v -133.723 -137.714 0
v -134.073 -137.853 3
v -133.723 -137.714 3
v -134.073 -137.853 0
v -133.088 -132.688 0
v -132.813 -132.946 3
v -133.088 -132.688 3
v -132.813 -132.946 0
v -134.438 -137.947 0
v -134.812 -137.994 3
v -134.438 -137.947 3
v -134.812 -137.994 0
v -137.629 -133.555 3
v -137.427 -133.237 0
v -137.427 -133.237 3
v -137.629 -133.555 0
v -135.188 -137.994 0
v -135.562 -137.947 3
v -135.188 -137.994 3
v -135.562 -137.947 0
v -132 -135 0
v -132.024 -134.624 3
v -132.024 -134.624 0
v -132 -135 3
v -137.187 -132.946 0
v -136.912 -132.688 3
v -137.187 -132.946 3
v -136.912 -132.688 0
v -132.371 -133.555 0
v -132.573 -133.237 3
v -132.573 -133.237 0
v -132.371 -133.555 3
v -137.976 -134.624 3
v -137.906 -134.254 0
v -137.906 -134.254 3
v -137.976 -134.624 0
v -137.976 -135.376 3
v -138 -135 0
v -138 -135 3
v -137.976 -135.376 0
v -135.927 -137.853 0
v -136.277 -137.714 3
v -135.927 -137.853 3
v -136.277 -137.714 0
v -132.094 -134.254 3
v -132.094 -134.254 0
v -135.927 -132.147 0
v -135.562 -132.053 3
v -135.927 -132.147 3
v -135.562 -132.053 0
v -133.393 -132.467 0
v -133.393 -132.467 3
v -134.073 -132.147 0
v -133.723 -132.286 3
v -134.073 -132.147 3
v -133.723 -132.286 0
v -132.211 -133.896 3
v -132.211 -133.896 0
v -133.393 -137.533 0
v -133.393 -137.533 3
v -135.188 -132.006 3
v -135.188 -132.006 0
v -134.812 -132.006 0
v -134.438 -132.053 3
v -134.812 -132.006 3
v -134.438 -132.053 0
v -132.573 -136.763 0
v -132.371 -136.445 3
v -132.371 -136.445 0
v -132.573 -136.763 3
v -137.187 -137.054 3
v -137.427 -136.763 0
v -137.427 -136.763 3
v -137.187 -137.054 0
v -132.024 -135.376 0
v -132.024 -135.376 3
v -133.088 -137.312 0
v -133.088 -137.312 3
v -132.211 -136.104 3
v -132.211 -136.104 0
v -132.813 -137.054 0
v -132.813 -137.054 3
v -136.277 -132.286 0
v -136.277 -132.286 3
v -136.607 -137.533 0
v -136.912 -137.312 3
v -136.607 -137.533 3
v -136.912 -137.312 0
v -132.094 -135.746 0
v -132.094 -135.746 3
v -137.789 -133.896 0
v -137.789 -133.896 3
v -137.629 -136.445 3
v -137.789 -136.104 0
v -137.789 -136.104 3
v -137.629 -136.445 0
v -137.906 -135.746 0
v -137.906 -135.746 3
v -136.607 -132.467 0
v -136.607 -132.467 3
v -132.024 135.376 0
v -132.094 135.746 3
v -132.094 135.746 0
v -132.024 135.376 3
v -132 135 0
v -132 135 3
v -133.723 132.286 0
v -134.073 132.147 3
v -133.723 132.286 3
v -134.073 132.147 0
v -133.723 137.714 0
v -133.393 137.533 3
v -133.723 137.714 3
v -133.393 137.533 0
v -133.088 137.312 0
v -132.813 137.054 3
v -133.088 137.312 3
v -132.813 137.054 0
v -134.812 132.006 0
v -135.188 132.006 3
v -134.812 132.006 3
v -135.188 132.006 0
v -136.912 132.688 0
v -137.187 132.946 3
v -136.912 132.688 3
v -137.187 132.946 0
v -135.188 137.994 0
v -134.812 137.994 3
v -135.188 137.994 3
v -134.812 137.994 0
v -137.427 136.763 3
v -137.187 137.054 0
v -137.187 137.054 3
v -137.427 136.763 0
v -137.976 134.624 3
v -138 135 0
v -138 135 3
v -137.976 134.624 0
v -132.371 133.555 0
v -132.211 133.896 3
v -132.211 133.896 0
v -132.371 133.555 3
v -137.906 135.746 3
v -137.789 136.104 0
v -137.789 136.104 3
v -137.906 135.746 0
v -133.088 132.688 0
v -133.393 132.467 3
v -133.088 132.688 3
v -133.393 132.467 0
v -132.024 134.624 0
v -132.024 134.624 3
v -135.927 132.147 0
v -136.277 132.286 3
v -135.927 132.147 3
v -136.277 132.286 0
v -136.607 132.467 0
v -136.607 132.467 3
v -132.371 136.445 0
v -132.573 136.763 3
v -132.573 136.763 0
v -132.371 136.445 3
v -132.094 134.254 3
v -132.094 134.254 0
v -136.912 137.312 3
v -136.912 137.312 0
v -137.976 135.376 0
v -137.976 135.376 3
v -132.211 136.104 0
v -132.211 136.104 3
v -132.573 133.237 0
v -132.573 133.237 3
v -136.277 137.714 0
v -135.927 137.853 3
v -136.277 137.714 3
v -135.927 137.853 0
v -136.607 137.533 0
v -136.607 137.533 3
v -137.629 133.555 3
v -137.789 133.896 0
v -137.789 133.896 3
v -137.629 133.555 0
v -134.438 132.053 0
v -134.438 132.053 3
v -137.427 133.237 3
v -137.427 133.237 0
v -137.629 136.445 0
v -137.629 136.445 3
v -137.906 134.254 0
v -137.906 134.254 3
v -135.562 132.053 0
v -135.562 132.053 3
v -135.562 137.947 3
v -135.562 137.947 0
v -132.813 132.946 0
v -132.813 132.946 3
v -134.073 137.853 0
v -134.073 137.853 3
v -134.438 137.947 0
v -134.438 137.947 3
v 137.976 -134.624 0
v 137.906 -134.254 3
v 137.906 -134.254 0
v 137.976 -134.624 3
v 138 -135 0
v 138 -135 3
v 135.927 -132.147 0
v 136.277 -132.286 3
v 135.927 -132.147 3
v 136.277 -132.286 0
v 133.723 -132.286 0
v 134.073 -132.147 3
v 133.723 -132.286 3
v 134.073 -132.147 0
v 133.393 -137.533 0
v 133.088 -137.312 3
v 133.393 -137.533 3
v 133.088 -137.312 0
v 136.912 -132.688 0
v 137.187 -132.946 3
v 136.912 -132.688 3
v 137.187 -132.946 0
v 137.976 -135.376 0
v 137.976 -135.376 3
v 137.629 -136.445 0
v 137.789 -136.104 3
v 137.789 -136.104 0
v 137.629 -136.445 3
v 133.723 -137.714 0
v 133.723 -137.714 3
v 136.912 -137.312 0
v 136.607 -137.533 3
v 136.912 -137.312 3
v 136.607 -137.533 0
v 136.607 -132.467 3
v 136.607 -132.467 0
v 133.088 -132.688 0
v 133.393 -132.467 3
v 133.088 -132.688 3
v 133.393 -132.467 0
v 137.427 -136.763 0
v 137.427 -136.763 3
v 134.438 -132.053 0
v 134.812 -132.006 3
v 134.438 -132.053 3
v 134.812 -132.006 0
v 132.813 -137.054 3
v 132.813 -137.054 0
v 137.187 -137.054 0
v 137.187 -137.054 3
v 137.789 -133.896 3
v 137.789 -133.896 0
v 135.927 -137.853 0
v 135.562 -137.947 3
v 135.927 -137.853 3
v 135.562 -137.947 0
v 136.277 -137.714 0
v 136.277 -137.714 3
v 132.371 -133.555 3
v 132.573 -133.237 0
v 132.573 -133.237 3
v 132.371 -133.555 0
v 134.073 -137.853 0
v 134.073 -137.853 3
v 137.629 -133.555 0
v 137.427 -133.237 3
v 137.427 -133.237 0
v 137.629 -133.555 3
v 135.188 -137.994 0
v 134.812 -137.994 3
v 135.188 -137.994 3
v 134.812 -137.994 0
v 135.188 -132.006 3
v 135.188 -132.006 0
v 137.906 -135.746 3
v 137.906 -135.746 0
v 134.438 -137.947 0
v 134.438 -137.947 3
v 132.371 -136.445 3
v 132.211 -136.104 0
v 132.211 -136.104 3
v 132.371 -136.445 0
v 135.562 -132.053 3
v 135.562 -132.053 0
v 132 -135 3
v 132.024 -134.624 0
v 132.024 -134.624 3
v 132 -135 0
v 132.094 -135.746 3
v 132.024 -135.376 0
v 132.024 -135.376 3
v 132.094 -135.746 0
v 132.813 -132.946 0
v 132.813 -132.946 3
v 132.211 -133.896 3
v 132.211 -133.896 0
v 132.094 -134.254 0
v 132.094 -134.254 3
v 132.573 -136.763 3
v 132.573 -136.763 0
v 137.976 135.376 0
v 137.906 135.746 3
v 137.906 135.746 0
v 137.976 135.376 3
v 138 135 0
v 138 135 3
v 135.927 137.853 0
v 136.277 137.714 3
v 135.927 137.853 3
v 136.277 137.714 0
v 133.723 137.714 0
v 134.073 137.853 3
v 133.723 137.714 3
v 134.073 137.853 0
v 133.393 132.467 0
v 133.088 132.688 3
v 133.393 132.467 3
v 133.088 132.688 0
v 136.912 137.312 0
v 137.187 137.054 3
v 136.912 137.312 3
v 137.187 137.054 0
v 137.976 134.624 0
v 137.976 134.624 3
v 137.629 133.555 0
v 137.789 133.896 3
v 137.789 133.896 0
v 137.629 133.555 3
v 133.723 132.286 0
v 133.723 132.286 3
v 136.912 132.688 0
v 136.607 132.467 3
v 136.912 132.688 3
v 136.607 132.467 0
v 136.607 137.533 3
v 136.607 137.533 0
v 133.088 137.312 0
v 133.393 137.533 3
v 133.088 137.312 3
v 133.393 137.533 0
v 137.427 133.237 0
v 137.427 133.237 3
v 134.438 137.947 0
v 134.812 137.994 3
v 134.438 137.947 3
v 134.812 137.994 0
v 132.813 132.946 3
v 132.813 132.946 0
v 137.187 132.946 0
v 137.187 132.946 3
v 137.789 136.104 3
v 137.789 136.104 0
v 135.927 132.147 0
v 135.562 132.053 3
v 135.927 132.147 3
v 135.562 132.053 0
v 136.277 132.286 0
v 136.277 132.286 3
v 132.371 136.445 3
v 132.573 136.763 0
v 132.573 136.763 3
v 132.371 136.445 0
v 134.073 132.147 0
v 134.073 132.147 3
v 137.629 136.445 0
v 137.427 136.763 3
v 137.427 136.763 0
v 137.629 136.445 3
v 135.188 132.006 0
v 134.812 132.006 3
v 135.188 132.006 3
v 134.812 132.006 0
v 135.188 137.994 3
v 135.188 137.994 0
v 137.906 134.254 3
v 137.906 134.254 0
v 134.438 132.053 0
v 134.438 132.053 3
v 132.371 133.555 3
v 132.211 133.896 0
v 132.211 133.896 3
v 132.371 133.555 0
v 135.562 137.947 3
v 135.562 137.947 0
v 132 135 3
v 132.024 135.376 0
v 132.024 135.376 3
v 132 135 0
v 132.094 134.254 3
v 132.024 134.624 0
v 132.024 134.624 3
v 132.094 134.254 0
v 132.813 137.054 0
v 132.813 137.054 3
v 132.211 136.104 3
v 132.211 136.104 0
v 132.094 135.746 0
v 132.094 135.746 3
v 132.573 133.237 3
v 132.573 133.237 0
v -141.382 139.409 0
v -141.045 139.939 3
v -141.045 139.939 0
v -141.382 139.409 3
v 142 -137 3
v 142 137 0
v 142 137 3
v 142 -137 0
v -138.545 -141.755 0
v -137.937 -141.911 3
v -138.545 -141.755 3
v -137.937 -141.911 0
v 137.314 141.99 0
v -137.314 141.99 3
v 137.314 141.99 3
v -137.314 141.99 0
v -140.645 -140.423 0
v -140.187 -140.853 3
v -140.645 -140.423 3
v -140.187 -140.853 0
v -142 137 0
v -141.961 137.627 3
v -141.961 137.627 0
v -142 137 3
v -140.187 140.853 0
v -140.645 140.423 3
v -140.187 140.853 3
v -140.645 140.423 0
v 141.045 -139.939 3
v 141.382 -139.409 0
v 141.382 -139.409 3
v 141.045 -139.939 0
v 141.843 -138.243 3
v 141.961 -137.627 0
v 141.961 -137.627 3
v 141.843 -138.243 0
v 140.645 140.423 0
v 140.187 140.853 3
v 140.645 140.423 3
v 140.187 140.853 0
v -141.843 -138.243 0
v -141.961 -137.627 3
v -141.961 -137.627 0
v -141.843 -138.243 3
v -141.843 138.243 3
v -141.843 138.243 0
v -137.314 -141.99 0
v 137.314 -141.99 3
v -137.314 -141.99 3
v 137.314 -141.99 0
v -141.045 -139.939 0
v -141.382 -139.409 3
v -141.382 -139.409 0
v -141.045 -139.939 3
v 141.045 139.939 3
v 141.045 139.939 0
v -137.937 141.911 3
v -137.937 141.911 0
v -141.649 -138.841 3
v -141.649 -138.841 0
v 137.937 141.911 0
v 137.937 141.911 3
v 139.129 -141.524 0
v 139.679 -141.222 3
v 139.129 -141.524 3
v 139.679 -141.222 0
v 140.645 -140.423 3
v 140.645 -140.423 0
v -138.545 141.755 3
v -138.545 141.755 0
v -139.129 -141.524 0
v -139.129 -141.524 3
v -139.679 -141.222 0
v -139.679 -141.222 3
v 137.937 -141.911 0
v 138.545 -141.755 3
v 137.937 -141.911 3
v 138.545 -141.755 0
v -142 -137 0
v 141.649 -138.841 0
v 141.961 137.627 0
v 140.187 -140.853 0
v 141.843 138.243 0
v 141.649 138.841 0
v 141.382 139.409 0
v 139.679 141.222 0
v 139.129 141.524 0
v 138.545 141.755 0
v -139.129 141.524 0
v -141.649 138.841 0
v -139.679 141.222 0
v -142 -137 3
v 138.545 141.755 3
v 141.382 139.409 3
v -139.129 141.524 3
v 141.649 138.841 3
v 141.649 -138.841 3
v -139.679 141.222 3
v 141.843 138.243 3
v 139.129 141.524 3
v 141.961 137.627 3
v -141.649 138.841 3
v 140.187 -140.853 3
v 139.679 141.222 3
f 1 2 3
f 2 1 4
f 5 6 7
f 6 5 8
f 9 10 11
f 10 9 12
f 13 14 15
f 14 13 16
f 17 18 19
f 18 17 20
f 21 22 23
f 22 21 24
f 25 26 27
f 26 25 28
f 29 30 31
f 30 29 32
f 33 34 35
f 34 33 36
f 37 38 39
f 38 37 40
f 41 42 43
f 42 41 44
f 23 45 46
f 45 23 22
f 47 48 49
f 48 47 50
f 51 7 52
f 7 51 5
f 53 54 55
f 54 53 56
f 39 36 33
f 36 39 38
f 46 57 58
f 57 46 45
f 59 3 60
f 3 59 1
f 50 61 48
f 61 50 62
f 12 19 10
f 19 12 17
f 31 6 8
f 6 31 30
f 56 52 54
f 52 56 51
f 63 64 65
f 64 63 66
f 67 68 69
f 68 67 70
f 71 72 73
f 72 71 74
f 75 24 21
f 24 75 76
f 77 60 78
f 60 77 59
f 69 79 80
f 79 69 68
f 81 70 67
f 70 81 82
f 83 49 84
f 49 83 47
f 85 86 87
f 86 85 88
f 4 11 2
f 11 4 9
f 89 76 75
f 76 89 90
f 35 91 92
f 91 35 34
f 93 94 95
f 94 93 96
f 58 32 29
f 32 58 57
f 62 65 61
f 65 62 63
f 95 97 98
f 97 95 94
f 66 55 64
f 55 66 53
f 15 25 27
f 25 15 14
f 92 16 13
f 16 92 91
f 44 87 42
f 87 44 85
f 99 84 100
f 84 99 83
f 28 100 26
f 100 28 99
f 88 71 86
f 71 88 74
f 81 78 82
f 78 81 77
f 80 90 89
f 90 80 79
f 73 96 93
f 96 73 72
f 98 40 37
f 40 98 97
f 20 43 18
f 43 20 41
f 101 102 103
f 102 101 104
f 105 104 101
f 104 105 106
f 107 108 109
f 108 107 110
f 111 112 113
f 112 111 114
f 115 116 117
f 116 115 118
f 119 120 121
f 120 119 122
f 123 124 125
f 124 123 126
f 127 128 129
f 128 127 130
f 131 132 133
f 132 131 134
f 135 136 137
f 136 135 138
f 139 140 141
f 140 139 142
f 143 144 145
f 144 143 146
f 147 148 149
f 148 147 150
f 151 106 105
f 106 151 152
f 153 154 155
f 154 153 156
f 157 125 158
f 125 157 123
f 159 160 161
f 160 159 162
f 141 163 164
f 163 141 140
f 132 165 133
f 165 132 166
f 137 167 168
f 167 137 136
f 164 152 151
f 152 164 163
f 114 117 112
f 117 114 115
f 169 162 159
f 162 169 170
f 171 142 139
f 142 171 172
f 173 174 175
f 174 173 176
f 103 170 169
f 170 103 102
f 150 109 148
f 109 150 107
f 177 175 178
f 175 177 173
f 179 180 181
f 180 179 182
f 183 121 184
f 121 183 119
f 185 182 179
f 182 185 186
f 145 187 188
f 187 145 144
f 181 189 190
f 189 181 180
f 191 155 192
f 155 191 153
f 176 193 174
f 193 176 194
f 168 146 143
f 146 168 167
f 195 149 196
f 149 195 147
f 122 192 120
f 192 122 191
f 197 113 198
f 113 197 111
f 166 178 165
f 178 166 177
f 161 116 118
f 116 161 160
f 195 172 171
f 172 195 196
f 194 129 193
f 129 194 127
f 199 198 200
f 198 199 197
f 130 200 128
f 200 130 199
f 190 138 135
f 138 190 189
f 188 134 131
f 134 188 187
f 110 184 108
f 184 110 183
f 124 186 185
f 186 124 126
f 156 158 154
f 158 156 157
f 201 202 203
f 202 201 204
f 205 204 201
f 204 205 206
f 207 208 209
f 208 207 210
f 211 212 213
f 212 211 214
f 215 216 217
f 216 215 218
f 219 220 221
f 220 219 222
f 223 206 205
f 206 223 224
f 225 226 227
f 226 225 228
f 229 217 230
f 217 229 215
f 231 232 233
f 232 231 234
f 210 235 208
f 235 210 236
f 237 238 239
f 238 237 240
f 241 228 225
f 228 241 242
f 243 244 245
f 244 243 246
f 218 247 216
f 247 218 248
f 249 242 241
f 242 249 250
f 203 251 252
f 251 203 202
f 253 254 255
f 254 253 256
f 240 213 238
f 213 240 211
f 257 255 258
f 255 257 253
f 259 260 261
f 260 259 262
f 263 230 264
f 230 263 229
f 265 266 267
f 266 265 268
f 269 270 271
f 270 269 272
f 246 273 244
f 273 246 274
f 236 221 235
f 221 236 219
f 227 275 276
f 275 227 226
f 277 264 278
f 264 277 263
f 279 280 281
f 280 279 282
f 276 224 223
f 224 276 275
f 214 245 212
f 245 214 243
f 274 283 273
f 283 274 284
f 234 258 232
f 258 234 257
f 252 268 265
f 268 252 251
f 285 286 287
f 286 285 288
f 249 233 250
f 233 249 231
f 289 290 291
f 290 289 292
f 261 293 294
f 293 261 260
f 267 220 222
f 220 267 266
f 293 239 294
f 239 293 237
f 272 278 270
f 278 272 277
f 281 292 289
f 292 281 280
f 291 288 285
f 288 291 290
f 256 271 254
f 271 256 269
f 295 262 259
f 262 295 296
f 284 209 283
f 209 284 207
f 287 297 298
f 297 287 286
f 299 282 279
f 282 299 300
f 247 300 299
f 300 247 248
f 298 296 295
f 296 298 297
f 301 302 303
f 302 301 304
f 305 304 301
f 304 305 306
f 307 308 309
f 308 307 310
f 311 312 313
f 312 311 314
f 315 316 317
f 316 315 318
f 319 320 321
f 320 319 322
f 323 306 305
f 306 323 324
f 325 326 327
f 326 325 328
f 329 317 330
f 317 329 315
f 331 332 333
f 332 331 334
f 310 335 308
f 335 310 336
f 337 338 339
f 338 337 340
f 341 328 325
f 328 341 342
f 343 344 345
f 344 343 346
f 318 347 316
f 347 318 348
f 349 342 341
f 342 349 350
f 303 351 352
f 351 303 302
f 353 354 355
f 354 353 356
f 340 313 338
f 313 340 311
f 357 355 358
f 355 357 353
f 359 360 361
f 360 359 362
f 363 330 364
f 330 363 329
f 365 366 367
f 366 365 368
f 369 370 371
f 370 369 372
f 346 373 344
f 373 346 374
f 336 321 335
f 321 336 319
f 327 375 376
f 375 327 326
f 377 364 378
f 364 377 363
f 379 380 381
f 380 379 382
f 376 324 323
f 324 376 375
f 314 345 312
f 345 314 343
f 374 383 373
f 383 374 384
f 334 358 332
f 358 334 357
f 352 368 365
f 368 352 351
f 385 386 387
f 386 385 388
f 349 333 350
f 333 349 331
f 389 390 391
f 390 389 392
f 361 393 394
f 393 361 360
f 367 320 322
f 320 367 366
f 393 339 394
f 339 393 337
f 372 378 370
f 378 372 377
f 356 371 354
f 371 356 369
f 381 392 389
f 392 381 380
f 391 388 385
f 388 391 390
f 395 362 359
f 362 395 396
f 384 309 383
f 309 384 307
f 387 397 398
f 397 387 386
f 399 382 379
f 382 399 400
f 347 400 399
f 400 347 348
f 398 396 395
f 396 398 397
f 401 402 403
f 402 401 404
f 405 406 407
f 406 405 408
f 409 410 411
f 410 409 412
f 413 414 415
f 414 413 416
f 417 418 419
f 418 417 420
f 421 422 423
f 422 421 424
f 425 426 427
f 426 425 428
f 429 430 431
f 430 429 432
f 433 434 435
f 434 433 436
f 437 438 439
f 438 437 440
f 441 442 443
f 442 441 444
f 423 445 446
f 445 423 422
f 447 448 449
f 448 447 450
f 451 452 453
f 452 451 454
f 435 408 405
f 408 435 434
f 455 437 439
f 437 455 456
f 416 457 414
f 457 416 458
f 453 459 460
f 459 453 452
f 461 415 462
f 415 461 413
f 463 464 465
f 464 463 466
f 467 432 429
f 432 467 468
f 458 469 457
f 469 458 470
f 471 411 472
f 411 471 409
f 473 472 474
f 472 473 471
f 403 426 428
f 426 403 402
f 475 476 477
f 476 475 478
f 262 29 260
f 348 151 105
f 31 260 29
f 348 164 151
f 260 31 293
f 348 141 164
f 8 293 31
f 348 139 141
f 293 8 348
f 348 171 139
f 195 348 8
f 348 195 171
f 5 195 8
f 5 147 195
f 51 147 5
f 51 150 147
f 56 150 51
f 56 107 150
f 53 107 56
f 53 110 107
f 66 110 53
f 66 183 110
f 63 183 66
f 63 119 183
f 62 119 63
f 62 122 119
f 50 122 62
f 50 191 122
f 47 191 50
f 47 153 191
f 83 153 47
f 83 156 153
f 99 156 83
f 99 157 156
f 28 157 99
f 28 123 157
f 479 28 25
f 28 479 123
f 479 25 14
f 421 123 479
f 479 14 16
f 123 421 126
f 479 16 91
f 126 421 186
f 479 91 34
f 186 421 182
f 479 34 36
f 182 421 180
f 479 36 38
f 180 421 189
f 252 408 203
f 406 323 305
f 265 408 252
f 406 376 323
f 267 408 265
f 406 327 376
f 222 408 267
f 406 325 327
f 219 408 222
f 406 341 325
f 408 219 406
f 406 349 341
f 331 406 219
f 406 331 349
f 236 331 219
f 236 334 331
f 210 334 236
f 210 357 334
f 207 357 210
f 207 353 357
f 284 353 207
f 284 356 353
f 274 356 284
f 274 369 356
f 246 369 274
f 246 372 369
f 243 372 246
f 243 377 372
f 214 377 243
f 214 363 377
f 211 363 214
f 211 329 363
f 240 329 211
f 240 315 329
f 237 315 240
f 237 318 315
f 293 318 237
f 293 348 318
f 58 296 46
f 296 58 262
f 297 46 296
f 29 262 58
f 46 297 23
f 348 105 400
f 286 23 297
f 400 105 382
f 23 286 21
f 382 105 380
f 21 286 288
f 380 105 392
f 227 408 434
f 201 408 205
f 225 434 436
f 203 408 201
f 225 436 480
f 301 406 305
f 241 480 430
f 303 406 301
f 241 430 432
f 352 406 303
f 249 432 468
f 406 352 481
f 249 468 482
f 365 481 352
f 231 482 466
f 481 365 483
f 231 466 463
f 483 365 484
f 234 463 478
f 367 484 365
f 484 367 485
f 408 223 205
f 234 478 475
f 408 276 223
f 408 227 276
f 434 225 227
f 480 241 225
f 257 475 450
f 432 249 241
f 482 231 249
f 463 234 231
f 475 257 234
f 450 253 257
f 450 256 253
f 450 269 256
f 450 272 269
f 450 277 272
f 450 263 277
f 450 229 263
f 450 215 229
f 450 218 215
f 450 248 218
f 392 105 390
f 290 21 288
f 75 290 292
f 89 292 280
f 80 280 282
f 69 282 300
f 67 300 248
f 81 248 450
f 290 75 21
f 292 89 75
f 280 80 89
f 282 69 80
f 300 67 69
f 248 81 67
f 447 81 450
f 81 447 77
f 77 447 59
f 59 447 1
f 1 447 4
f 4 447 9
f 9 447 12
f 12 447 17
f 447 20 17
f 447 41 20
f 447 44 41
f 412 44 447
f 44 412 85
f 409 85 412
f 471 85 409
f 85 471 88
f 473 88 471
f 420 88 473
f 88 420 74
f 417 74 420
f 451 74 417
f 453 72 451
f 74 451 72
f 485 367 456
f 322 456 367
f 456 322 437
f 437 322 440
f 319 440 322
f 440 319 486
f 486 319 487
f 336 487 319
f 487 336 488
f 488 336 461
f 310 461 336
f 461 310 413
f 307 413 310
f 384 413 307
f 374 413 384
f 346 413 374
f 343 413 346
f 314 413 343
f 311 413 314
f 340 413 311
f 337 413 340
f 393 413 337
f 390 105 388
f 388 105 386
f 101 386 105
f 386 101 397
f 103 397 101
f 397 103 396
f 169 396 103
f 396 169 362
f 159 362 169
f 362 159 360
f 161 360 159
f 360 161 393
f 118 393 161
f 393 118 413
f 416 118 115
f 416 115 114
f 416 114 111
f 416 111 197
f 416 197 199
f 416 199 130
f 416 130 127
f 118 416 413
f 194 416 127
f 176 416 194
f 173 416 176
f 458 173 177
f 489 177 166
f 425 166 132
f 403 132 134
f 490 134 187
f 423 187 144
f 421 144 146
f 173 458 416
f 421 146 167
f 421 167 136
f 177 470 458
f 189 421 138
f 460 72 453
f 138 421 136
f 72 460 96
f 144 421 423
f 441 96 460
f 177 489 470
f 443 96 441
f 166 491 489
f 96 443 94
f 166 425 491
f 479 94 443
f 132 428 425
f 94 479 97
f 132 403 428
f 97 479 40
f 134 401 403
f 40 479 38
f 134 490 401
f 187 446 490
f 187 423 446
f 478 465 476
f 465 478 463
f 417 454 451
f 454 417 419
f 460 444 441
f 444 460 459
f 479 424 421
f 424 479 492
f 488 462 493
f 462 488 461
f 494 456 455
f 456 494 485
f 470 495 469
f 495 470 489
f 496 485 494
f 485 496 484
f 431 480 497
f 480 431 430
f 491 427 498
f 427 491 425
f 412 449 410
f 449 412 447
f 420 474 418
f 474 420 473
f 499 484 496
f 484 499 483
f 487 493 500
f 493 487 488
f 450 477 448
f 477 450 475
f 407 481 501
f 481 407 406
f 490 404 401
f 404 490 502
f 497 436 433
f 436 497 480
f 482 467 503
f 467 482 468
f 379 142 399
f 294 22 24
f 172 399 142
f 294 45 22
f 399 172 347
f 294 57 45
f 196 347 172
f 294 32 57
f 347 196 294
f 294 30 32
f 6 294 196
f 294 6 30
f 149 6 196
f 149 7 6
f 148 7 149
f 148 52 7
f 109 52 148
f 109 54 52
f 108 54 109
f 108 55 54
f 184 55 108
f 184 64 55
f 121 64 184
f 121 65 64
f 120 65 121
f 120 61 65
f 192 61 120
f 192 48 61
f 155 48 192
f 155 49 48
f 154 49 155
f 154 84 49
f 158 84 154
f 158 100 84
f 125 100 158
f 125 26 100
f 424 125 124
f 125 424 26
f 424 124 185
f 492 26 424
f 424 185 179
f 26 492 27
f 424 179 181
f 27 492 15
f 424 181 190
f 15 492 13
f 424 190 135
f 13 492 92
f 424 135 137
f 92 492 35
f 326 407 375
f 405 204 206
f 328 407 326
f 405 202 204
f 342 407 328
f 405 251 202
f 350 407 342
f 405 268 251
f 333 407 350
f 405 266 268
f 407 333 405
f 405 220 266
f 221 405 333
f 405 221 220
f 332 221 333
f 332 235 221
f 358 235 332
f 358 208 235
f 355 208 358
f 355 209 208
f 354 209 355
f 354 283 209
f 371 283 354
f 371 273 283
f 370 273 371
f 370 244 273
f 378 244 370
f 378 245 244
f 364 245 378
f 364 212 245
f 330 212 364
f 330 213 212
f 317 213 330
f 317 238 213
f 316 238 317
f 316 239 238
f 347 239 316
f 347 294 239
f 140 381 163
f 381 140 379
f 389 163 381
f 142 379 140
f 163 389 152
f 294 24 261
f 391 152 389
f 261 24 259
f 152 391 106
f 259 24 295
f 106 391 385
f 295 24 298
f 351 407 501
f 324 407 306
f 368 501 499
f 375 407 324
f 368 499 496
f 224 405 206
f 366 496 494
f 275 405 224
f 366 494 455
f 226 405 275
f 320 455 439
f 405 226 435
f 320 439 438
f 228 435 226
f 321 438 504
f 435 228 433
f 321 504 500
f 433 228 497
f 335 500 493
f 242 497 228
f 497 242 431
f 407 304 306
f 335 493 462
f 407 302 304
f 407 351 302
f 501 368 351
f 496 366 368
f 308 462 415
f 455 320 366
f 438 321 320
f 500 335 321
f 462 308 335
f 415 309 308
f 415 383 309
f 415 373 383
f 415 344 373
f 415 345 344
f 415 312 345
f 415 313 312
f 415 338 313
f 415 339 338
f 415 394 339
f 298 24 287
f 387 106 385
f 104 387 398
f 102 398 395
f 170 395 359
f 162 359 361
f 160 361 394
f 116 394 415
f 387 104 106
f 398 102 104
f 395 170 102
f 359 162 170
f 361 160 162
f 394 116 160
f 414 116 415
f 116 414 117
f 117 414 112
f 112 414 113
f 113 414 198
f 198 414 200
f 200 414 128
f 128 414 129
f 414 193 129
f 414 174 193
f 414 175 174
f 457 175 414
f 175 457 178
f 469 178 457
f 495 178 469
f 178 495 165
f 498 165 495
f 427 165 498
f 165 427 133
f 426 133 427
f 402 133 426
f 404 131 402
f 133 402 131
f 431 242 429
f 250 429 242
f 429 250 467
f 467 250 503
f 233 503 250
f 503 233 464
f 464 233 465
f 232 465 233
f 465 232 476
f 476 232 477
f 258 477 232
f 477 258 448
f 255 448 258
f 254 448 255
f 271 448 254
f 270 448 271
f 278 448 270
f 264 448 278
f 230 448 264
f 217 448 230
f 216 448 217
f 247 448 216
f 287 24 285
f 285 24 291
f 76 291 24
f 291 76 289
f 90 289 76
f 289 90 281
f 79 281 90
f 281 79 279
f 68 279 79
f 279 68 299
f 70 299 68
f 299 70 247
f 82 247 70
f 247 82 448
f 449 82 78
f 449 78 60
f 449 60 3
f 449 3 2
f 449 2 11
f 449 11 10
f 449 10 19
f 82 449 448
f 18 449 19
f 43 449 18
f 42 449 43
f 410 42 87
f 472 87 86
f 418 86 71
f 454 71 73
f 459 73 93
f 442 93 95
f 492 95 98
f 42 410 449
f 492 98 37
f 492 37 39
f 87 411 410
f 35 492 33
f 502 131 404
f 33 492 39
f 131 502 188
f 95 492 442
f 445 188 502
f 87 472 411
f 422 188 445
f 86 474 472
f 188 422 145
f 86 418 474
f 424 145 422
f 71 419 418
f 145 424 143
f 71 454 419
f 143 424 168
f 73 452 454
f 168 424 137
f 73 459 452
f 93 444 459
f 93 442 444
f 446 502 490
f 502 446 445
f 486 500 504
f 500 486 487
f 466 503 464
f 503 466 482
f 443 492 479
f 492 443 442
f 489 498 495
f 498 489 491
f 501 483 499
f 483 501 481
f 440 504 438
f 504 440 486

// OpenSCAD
$fn = 50;


difference() {
	union() {
		hull() {
			translate(v = [-137.0000000000, 137.0000000000, 0]) {
				cylinder(h = 3, r = 5);
			}
			translate(v = [137.0000000000, 137.0000000000, 0]) {
				cylinder(h = 3, r = 5);
			}
			translate(v = [-137.0000000000, -137.0000000000, 0]) {
				cylinder(h = 3, r = 5);
			}
			translate(v = [137.0000000000, -137.0000000000, 0]) {
				cylinder(h = 3, r = 5);
			}
		}
	}
	union() {
		translate(v = [-135.0000000000, -135.0000000000, -100.0000000000]) {
			cylinder(h = 200, r = 3.0000000000);
		}
		translate(v = [-135.0000000000, 135.0000000000, -100.0000000000]) {
			cylinder(h = 200, r = 3.0000000000);
		}
		translate(v = [135.0000000000, -135.0000000000, -100.0000000000]) {
			cylinder(h = 200, r = 3.0000000000);
		}
		translate(v = [135.0000000000, 135.0000000000, -100.0000000000]) {
			cylinder(h = 200, r = 3.0000000000);
		}
	}
}
